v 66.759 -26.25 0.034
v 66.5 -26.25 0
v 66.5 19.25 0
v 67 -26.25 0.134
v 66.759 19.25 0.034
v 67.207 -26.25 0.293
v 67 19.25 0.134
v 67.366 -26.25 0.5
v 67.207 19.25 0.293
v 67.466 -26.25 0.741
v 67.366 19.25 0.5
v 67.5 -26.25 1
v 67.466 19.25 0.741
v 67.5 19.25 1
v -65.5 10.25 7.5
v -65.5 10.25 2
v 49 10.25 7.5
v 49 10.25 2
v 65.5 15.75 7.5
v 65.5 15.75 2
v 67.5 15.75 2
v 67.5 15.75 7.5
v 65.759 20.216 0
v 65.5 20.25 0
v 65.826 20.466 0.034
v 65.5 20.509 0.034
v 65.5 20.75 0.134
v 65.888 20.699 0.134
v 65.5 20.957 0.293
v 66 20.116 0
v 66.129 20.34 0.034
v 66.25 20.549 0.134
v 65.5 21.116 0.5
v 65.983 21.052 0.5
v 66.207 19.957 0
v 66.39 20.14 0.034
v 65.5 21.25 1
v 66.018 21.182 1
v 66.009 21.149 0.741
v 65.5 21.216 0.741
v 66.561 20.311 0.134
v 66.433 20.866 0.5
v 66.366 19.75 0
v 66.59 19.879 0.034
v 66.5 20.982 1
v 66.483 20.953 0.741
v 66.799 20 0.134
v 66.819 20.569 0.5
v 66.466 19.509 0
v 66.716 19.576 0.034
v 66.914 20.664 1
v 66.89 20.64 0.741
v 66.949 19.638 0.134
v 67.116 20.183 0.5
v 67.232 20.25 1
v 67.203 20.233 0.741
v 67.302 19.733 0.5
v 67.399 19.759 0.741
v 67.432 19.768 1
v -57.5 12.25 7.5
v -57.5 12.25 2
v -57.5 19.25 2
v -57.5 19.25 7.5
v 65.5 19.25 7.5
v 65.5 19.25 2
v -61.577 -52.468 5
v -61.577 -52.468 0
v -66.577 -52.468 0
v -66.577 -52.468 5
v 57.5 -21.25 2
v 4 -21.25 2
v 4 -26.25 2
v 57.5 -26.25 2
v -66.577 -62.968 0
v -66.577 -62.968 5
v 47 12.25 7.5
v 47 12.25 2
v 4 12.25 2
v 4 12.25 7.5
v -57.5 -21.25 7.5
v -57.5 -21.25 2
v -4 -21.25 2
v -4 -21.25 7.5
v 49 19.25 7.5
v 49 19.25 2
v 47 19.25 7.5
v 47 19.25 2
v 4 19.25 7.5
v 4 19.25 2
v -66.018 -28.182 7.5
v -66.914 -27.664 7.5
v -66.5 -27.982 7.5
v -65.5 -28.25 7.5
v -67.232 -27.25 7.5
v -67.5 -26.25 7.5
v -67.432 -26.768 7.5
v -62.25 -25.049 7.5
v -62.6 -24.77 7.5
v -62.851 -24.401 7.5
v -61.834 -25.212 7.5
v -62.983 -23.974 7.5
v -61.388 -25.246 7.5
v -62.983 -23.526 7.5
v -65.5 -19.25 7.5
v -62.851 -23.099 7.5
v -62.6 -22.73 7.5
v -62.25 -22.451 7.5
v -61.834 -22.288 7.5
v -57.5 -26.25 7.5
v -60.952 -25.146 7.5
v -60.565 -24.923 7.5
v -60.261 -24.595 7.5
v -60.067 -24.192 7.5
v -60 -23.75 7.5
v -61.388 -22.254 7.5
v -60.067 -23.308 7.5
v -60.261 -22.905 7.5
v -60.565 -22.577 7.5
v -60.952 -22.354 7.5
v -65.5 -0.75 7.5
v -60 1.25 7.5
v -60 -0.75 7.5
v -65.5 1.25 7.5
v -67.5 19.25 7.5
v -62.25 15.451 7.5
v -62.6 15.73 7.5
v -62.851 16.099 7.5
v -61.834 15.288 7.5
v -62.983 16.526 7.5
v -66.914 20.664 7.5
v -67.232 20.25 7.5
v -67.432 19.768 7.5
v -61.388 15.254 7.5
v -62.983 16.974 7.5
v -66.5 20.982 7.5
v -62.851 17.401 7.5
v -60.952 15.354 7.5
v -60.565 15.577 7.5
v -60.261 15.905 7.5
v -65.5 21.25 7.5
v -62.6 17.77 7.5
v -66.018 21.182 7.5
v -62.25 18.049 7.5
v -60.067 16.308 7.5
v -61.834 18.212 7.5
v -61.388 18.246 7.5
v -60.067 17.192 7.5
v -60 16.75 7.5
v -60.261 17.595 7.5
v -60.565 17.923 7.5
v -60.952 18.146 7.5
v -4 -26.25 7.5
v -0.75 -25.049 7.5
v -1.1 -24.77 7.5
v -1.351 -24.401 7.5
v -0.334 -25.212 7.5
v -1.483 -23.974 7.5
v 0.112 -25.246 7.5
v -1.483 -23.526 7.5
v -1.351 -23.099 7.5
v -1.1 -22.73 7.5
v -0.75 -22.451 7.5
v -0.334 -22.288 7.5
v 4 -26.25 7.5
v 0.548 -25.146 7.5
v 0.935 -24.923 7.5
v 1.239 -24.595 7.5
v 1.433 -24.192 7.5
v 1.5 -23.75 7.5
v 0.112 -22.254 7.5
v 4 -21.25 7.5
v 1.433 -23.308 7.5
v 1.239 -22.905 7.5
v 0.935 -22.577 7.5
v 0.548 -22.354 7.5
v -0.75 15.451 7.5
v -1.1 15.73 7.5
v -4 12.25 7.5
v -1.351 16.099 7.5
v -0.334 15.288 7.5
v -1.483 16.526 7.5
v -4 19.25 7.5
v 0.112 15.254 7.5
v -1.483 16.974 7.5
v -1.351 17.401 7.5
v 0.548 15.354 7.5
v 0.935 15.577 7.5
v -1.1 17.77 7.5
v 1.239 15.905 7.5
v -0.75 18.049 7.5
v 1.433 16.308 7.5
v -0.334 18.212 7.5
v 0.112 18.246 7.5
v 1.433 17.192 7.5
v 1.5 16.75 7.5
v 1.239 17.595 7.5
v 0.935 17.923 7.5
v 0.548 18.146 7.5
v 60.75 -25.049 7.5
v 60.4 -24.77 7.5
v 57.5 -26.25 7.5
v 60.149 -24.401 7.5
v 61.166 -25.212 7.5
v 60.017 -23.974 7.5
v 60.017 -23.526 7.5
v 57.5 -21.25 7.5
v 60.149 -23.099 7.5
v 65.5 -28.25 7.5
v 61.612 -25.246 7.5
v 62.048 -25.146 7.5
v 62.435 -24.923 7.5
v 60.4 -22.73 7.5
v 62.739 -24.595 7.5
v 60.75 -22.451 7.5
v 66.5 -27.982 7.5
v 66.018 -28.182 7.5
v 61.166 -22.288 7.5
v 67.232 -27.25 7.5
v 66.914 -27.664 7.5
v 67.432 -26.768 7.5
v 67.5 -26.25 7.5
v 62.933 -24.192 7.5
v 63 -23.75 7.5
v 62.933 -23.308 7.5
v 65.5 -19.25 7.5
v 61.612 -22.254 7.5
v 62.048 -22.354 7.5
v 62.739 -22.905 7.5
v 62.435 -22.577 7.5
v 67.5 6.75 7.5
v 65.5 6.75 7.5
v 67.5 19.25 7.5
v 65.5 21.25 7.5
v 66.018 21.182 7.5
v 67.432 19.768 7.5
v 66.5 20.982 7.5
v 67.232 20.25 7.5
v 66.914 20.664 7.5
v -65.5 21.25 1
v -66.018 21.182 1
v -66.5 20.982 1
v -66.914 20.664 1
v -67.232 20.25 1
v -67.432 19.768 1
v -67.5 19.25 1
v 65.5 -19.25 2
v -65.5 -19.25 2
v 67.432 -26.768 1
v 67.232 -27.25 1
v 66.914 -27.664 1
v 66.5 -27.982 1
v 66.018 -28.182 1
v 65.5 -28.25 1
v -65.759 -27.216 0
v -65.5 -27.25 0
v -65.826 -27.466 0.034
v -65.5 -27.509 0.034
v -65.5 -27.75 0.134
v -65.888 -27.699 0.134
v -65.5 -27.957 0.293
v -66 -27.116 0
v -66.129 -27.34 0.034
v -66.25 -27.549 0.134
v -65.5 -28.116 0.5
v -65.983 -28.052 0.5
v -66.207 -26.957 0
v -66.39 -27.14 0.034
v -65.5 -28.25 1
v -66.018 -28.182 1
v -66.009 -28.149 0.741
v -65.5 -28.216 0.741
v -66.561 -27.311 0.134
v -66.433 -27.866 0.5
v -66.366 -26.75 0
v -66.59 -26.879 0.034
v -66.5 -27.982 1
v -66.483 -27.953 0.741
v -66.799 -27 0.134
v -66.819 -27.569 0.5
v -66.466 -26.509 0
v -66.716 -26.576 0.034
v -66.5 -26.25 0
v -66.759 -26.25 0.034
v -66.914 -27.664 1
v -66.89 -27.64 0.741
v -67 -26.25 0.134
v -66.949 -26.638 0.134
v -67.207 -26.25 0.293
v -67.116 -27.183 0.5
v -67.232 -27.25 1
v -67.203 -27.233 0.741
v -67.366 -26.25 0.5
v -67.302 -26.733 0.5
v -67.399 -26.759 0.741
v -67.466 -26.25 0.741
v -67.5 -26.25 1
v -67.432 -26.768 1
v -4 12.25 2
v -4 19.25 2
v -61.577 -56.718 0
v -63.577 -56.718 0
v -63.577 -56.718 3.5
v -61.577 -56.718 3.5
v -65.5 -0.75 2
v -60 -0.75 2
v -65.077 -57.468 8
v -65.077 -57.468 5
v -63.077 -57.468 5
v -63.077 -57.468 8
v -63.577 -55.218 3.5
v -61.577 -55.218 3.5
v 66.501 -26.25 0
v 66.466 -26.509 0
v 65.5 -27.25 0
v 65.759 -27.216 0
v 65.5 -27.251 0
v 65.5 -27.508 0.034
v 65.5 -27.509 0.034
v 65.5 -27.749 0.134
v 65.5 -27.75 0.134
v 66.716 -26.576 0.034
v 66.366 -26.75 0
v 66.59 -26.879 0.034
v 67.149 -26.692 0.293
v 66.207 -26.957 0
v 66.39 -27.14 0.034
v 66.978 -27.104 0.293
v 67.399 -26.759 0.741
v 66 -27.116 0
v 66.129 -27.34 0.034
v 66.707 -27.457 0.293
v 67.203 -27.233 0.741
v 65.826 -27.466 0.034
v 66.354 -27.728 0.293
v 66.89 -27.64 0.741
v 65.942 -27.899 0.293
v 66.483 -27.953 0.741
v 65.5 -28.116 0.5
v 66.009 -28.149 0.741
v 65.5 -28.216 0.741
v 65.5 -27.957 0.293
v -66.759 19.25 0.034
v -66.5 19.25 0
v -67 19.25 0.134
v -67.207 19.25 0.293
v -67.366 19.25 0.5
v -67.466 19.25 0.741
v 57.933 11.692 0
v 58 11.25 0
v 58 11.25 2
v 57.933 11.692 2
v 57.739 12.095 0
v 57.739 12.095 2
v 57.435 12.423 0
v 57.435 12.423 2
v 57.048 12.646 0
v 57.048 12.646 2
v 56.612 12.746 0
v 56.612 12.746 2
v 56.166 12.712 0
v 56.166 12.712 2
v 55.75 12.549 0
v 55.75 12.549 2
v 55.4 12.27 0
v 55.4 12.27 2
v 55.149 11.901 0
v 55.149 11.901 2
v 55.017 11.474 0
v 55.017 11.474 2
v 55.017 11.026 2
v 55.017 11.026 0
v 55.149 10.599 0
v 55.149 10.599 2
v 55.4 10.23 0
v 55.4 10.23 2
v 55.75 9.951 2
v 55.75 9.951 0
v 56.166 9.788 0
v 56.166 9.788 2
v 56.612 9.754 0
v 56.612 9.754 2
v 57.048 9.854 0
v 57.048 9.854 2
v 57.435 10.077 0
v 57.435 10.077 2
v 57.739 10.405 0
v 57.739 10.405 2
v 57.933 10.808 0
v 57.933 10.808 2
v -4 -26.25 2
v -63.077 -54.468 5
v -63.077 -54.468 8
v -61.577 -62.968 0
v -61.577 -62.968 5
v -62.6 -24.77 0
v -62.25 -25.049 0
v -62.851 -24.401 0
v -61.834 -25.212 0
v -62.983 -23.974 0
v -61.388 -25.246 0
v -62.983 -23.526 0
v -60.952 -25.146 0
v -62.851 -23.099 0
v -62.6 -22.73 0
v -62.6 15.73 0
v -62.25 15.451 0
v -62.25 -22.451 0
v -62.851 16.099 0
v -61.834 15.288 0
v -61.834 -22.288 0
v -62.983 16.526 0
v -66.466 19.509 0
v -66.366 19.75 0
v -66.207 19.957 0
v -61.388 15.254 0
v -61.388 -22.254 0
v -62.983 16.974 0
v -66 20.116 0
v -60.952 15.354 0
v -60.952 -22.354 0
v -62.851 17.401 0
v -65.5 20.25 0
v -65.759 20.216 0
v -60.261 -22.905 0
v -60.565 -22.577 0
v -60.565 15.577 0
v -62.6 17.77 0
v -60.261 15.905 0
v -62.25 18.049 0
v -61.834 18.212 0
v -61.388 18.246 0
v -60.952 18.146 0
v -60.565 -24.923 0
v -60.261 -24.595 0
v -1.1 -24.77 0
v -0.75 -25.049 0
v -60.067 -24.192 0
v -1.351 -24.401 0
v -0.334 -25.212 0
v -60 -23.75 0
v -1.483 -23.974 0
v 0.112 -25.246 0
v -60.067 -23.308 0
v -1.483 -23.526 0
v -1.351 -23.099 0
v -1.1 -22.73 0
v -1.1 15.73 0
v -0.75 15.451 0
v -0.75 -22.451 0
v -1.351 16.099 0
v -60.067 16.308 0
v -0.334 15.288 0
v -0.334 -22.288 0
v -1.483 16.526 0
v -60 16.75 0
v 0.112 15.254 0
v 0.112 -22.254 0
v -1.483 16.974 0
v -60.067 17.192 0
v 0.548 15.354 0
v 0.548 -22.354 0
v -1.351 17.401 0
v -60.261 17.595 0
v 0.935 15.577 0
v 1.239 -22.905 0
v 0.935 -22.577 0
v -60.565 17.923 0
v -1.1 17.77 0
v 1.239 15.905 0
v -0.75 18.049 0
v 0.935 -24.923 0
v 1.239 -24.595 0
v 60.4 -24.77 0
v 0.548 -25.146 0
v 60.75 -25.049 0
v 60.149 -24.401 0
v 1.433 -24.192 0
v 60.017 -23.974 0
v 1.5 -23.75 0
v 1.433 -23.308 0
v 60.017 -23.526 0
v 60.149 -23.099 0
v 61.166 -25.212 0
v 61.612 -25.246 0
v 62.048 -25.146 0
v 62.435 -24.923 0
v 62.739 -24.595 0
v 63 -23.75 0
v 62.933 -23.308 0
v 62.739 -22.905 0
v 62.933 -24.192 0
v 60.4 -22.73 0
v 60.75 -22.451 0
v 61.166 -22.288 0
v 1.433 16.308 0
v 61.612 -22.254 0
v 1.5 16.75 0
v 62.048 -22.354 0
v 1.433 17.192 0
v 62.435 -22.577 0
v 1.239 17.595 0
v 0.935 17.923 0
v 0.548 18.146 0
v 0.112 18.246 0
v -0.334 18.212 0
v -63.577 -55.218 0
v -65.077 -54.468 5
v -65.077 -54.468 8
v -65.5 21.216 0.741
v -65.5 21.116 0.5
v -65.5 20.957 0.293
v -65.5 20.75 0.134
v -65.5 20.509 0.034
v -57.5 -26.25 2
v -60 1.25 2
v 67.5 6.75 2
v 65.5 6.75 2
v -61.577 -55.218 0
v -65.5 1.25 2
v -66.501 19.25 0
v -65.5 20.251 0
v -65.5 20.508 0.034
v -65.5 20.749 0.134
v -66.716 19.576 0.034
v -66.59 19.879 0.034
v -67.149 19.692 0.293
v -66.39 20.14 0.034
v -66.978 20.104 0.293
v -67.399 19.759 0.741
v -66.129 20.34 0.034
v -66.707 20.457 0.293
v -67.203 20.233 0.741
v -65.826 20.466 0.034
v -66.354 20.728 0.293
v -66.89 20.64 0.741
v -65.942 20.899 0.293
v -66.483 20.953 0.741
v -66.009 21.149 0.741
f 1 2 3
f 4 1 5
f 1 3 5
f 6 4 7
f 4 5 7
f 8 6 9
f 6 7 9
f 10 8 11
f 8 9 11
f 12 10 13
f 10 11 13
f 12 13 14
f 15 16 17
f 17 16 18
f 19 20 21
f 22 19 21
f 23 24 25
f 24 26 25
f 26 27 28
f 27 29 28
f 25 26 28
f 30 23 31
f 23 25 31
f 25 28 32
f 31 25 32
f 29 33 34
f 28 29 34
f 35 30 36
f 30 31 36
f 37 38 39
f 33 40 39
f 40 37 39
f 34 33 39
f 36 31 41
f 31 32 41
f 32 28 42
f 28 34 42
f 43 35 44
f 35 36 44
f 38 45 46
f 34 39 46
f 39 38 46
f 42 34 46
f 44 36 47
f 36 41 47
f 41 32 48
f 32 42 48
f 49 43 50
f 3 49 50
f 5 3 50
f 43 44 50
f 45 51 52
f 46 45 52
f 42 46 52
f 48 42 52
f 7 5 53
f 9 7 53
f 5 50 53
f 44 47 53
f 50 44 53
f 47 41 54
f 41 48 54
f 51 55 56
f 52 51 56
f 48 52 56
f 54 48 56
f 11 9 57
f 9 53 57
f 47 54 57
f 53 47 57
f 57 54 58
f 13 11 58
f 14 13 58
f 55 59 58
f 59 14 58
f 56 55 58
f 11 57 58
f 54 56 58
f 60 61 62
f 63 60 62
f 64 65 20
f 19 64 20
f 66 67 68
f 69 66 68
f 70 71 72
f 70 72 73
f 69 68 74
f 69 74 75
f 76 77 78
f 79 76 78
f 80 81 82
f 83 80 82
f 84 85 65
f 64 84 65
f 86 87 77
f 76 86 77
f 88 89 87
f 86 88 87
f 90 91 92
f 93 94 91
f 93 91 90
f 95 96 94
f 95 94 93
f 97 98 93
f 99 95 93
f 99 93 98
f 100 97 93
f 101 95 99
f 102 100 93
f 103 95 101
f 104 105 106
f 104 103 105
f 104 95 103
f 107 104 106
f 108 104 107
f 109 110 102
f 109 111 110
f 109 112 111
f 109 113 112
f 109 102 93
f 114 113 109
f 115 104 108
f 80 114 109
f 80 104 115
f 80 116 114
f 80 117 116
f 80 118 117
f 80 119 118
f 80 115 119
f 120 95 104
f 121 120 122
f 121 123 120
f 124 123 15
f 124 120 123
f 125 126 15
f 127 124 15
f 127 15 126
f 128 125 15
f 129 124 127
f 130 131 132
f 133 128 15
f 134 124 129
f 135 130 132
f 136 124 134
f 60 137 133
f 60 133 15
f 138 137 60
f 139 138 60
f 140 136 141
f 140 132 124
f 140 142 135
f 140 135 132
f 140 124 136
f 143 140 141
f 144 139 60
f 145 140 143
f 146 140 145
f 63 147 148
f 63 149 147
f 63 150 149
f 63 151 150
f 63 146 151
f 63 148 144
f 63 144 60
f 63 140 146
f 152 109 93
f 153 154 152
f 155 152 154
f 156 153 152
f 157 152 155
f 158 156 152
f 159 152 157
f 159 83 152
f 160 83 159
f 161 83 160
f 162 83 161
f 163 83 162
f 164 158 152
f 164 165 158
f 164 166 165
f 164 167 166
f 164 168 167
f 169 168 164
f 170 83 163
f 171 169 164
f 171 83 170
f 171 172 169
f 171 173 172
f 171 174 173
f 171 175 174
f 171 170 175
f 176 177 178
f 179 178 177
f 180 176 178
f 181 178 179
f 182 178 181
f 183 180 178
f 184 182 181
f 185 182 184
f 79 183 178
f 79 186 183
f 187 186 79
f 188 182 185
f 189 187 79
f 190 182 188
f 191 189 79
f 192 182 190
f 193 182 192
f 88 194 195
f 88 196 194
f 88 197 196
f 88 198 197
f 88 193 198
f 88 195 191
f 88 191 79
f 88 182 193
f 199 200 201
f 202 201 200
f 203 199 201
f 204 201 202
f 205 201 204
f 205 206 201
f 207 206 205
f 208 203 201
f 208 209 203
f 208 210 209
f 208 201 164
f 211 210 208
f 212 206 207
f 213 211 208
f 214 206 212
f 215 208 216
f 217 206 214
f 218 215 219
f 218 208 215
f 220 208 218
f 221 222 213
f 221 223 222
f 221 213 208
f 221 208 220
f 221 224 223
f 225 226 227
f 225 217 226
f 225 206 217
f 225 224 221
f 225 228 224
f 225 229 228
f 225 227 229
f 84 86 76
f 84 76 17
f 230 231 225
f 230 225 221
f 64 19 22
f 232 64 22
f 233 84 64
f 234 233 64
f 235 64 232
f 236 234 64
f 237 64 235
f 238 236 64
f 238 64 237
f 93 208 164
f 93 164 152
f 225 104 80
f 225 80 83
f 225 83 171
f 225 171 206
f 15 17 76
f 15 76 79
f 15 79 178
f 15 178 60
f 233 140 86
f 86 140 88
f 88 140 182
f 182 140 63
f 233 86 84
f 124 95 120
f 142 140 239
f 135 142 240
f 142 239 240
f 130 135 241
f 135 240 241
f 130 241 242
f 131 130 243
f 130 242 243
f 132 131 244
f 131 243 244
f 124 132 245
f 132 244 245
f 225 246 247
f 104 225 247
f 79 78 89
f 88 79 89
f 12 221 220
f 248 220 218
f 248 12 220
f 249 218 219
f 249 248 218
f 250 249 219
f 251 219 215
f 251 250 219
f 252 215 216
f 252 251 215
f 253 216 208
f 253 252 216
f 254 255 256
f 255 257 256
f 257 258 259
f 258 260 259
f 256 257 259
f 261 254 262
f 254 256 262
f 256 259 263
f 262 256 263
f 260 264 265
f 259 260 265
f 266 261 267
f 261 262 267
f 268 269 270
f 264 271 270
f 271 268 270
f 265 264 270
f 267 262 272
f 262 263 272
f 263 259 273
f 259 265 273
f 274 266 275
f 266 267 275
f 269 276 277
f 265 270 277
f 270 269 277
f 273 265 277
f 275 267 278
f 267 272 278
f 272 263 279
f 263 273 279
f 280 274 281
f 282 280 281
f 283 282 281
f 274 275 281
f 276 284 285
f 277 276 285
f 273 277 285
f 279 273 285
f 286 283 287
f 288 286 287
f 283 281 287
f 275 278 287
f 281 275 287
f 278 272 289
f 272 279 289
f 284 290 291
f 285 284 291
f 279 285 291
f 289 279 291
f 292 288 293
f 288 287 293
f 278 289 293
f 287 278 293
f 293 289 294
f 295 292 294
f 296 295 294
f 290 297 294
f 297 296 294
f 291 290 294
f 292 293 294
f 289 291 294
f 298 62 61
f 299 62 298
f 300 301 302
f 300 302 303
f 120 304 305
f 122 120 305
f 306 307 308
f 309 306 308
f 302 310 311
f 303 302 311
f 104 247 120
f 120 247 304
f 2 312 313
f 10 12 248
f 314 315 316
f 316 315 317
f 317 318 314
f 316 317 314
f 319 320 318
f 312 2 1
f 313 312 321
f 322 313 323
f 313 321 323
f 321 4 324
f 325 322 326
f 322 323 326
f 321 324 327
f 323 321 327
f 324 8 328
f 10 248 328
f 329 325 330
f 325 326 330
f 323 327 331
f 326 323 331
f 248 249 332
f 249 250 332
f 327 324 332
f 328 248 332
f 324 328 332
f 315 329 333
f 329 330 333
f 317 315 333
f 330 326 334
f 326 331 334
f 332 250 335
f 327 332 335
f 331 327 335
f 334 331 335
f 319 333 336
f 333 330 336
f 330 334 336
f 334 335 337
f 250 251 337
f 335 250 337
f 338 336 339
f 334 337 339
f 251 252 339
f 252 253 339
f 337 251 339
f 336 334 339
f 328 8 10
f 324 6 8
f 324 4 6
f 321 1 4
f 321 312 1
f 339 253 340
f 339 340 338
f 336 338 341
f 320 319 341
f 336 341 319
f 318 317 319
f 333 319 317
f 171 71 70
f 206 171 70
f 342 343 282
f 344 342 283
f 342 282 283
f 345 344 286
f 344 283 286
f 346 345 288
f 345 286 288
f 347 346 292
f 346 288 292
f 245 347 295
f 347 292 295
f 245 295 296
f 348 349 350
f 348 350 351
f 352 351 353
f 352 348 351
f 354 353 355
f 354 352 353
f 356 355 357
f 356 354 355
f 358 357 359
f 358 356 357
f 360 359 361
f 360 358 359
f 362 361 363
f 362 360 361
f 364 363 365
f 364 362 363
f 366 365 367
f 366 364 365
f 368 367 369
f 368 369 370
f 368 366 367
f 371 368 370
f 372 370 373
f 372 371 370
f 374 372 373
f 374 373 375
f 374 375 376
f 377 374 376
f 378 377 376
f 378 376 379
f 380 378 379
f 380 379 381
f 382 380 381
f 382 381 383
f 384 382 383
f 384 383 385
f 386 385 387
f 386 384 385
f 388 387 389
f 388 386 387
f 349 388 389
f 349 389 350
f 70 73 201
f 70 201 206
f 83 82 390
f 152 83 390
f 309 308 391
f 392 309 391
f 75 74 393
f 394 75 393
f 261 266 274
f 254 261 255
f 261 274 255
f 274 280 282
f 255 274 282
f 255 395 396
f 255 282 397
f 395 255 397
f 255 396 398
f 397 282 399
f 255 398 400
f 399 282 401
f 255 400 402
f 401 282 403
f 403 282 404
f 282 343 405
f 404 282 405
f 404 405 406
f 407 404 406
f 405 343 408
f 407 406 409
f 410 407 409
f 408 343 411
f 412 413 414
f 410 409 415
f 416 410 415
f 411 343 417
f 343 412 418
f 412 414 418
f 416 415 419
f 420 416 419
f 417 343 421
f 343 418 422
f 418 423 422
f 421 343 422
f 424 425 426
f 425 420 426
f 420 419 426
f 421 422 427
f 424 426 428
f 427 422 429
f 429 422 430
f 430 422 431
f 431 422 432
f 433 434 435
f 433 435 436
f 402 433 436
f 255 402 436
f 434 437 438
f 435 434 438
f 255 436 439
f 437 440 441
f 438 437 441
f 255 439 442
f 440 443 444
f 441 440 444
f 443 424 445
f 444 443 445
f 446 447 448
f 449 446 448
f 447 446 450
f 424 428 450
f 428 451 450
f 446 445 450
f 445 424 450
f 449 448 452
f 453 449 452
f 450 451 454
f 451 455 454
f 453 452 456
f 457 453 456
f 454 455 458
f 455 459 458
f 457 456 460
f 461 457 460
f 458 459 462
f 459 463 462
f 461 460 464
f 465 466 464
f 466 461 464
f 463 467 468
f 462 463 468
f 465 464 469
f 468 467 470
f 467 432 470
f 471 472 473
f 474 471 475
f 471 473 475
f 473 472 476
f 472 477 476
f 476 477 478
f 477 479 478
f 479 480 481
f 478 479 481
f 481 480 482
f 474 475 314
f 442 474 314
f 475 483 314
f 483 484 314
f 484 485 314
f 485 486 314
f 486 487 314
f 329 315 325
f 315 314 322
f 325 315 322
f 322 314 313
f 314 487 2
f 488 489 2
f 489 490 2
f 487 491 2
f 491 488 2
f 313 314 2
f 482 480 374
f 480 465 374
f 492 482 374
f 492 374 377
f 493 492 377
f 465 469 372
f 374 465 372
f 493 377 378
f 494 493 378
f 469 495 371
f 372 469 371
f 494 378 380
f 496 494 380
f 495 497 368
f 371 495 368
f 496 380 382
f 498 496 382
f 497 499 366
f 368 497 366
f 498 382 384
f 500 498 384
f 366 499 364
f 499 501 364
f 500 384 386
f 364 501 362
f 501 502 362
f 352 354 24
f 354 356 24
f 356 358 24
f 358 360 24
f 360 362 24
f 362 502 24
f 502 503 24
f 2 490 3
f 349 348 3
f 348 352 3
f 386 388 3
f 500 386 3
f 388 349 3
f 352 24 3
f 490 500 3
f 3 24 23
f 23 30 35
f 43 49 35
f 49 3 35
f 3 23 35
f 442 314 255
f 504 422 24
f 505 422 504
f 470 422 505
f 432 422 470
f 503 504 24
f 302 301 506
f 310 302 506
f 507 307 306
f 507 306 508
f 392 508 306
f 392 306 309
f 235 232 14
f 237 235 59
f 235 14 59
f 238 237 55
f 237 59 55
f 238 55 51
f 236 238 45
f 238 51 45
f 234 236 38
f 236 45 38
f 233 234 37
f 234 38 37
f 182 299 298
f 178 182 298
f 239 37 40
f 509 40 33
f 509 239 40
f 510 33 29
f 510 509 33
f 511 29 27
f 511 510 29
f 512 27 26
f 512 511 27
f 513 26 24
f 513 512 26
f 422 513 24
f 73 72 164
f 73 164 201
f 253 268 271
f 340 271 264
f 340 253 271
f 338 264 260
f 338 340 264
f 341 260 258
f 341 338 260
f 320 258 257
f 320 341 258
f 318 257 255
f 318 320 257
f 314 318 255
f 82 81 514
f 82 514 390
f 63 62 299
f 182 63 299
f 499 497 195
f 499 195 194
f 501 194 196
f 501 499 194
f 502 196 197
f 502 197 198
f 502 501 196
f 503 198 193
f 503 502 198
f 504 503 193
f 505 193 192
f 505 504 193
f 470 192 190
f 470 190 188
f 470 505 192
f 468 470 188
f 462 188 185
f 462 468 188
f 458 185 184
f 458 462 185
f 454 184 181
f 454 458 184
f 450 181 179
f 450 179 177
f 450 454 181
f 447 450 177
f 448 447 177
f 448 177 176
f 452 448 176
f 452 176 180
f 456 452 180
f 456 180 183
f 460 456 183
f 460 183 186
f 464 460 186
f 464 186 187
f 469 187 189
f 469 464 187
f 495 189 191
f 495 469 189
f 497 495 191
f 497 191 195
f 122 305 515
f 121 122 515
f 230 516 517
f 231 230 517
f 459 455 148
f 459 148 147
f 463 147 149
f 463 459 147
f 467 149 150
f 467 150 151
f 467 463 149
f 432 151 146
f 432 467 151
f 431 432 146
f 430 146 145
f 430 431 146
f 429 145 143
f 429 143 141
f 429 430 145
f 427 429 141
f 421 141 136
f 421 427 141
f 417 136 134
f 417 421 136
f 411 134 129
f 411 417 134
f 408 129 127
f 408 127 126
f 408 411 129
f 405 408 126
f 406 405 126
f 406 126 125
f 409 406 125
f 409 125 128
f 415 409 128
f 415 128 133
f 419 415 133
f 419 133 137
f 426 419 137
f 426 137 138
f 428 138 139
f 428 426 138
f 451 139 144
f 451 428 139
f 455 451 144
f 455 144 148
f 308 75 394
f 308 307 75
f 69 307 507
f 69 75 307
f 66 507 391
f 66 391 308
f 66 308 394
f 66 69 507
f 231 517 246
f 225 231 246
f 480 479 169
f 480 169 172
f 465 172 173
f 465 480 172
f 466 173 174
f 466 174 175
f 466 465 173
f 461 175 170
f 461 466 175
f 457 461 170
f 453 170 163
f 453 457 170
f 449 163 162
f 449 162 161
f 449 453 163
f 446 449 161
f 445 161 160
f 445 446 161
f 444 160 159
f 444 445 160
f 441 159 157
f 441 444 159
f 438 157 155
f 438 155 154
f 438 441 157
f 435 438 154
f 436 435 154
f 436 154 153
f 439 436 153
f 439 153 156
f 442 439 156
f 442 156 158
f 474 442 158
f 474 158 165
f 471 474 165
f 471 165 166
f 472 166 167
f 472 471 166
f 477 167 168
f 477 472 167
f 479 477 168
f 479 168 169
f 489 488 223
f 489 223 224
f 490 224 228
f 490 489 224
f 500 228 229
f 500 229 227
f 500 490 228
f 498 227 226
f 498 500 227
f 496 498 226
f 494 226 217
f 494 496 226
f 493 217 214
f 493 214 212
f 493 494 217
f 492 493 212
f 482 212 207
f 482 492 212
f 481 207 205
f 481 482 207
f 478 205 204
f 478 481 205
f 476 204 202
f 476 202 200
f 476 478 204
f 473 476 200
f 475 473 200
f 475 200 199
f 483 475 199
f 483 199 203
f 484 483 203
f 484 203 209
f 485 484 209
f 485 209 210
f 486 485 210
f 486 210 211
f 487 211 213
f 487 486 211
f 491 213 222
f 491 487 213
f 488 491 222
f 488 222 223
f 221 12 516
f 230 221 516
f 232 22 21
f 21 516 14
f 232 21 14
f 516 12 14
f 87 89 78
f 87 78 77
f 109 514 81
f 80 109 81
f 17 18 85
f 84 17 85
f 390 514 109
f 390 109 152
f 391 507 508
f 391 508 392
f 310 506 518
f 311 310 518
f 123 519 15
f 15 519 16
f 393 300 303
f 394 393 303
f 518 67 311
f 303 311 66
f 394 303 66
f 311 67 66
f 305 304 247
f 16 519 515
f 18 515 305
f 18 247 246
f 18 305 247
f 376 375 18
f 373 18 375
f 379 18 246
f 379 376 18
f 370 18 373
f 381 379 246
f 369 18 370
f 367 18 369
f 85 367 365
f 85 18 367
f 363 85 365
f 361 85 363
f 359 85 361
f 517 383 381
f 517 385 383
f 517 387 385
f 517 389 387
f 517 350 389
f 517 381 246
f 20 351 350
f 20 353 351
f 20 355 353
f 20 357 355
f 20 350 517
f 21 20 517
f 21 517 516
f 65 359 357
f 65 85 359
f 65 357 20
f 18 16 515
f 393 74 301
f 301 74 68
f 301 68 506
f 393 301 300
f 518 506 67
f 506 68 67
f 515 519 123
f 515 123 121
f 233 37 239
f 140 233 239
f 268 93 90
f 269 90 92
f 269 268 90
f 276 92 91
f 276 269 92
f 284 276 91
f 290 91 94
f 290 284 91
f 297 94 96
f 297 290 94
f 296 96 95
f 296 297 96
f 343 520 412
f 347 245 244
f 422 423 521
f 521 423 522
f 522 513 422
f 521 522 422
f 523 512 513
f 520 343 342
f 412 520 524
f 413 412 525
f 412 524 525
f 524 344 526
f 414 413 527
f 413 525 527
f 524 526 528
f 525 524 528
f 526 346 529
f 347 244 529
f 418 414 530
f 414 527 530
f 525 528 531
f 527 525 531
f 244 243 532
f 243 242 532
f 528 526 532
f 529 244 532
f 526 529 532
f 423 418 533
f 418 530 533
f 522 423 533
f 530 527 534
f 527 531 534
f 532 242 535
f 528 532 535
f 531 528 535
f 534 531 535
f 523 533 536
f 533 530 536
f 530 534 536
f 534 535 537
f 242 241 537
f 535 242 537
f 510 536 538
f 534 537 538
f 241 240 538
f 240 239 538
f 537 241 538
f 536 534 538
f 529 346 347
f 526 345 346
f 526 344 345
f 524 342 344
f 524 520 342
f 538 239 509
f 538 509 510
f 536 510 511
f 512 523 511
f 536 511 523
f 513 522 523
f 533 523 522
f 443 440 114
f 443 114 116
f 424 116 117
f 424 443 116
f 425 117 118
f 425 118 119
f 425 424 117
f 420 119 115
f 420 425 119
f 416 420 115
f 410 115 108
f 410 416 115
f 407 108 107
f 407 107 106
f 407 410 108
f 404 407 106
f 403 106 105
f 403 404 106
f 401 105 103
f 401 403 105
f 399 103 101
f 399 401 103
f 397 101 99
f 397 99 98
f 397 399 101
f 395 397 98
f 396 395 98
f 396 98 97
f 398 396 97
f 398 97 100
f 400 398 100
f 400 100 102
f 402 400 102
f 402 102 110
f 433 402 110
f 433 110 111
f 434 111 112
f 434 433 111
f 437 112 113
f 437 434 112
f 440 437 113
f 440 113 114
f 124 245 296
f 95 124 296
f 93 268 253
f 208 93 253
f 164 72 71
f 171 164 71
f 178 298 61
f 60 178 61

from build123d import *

# Parameters (mm, degrees)
F0_W         = 52
F0_H         = 22
F0_R         = 1.5
F0_W_2       = 5.5
F0_H_2       = 9
F0_H_3       = 18.5
F0_W_3       = 2
F0_W_4       = 48
F0_H_4       = 18
F1_DEPTH     = 2
F0_W_5       = 53.5
F0_H_5       = 7
F0_W_6       = 43
F0_H_6       = 5
F0_H_7       = 2
F0_W_7       = 8
F0_W_8       = 10
F2_DEPTH     = 7.5
F3_W         = 2
F3_H         = 1.5
F4_DEPTH     = 5
F5_DEPTH     = 3.5
F6_W         = 2
F6_H         = 3
F7_DEPTH     = 3
F8_R         = 1
F9_T1_DEPTH  = 12.5
F9_T4_ANGLE  = 90
F9_T6_ANGLE  = 90
F9_T8_ANGLE  = 90
F9_T10_ANGLE = 90
F10_DEPTH    = 2
F11_DEPTH    = 1
F12_DEPTH    = 2.5


# Not quite as in the source:
# - a fillet or chamfer that OpenCascade refuses, or shapes differently, is made with other operations: its cross-section is extruded or revolved along the edge and cut away or added


with BuildPart() as f1:
    # F0 (on Top) → F1 (new body)
    with BuildSketch(Plane.XY):
        Polygon((65.5, 15.75), (65.5, 19.25), (49, 19.25), (49, 10.25), (-60, 10.25), (-60, 1.25), (-60, -0.75), (-60, -19.25), (-4, -19.25), (4, -19.25), (57.5, -19.25), (65.5, -19.25), (65.5, 6.75), align=None)
        with Locations((0, -4.25)):
            Rectangle(F0_W, F0_H, mode=Mode.SUBTRACT)
        with Locations((56.5, 11.25)):
            Circle(F0_R, mode=Mode.SUBTRACT)
        with Locations((-62.75, 5.75)):
            Rectangle(F0_W_2, F0_H_2)
        with Locations((-62.75, -10)):
            Rectangle(F0_W_2, F0_H_3)
        with Locations((66.5, 11.25)):
            Rectangle(F0_W_3, F0_H_2)
        with Locations((0, -4.25)):
            Rectangle(F0_W, F0_H)
        with Locations((0, -4.25)):
            Rectangle(F0_W_4, F0_H_4, mode=Mode.SUBTRACT)
    extrude(amount=F1_DEPTH)



with BuildPart() as f1b:
    # F0 (on Top) → F1, piece 2 (new body)
    with BuildSketch(Plane.XY):
        with Locations((-30.75, 15.75)):
            Rectangle(F0_W_5, F0_H_5)
    extrude(amount=F1_DEPTH)


with BuildPart() as f1c:
    # F0 (on Top) → F1, piece 3 (new body)
    with BuildSketch(Plane.XY):
        with Locations((25.5, 15.75)):
            Rectangle(F0_W_6, F0_H_5)
    extrude(amount=F1_DEPTH)


with BuildPart() as f1d:
    # F0 (on Top) → F1, piece 4 (new body)
    with BuildSketch(Plane.XY):
        with Locations((30.75, -23.75)):
            Rectangle(F0_W_5, F0_H_6)
    extrude(amount=F1_DEPTH)


with BuildPart() as f1e:
    # F0 (on Top) → F1, piece 5 (new body)
    with BuildSketch(Plane.XY):
        with Locations((-30.75, -23.75)):
            Rectangle(F0_W_5, F0_H_6)
    extrude(amount=F1_DEPTH)


with BuildPart() as f1_1:
    add(f1.part)

    add(f1b.part)  # F2 merges F1b

    add(f1c.part)  # F2 merges F1c

    add(f1d.part)  # F2 merges F1d

    add(f1e.part)  # F2 merges F1e
    # F0 (on Top) → F2 (join)
    with BuildSketch(Plane.XY):
        Polygon((49, 10.25), (49, 19.25), (47, 19.25), (47, 12.25), (4, 12.25), (-4, 12.25), (-57.5, 12.25), (-65.5, 12.25), (-65.5, 10.25), (-60, 10.25), align=None)
        with Locations((-66.5, 11.25)):
            Rectangle(F0_W_3, F0_H_7)
        with Locations((-66.5, 5.75)):
            Rectangle(F0_W_3, F0_H_2)
        with Locations((-66.5, 0.25)):
            Rectangle(F0_W_3, F0_H_7)
        with Locations((-62.75, 0.25)):
            Rectangle(F0_W_2, F0_H_7)
        Polygon((-65.5, -19.25), (-65.5, -0.75), (-67.5, -0.75), (-67.5, -21.25), (-57.5, -21.25), (-4, -21.25), (-4, -19.25), (-60, -19.25), align=None)
        Polygon((49, 19.25), (65.5, 19.25), (65.5, 15.75), (67.5, 15.75), (67.5, 21.25), (47, 21.25), (47, 19.25), align=None)
        with Locations((0, -20.25)):
            Rectangle(F0_W_7, F0_H_7)
        with Locations((0, -23.75)):
            Rectangle(F0_W_7, F0_H_6)
        with Locations((0, -23.75)):
            Circle(F0_R, mode=Mode.SUBTRACT)
        with Locations((30.75, -20.25)):
            Rectangle(F0_W_5, F0_H_7)
        with Locations((0, -27.25)):
            Rectangle(F0_W_7, F0_H_7)
        with Locations((-30.75, -27.25)):
            Rectangle(F0_W_5, F0_H_7)
        with Locations((30.75, -27.25)):
            Rectangle(F0_W_5, F0_H_7)
        with Locations((-62.5, -23.75)):
            Rectangle(F0_W_8, F0_H_6)
        with Locations((-61.5, -23.75)):
            Circle(F0_R, mode=Mode.SUBTRACT)
        with Locations((-62.5, -27.25)):
            Rectangle(F0_W_8, F0_H_7)
        Polygon((67.5, 6.75), (65.5, 6.75), (65.5, -19.25), (57.5, -19.25), (57.5, -21.25), (67.5, -21.25), align=None)
        with Locations((62.5, -23.75)):
            Rectangle(F0_W_8, F0_H_6)
        with Locations((61.5, -23.75)):
            Circle(F0_R, mode=Mode.SUBTRACT)
        with Locations((62.5, -27.25)):
            Rectangle(F0_W_8, F0_H_7)
        with Locations((25.5, 20.25)):
            Rectangle(F0_W_6, F0_H_7)
        with Locations((0, 20.25)):
            Rectangle(F0_W_7, F0_H_7)
        with Locations((0, 15.75)):
            Rectangle(F0_W_7, F0_H_5)
        with Locations((0, 16.75)):
            Circle(F0_R, mode=Mode.SUBTRACT)
        with Locations((-61.5, 15.75)):
            Rectangle(F0_W_7, F0_H_5)
        with Locations((-61.5, 16.75)):
            Circle(F0_R, mode=Mode.SUBTRACT)
        Polygon((-65.5, 19.25), (-57.5, 19.25), (-57.5, 21.25), (-67.5, 21.25), (-67.5, 12.25), (-65.5, 12.25), align=None)
        with Locations((-30.75, 20.25)):
            Rectangle(F0_W_5, F0_H_7)
    extrude(amount=F2_DEPTH)

    # F8
    f8_edges = [f1_1.edges().sort_by_distance(p)[0] for p in [
        (67.5, -3.5, 0),
        (0, -28.25, 0),
        (0, 21.25, 0),
        (-67.5, -3.5, 0),
    ]]
    fillet(f8_edges, radius=F8_R)

    # F9: fillet of radius 2 on 4 edges, made by hand

    # F9_s2 → F9_t1 (cut)
    with BuildSketch(Plane.XY):
        with BuildLine():
            ThreePointArc((67.5, -26.25), (66.9142135624, -27.6642135624), (65.5, -28.25))
            Line((65.5, -28.25), (67.5, -28.25))
            Line((67.5, -28.25), (67.5, -26.25))
        make_face()
        with BuildLine():
            ThreePointArc((67.5, 19.25), (66.9142135624, 20.6642135624), (65.5, 21.25))
            Line((65.5, 21.25), (67.5, 21.25))
            Line((67.5, 21.25), (67.5, 19.25))
        make_face()
        with BuildLine():
            ThreePointArc((-65.5, 21.25), (-66.9142135624, 20.6642135624), (-67.5, 19.25))
            Line((-67.5, 19.25), (-67.5, 21.25))
            Line((-67.5, 21.25), (-65.5, 21.25))
        make_face()
        with BuildLine():
            ThreePointArc((-65.5, -28.25), (-66.9142135624, -27.6642135624), (-67.5, -26.25))
            Line((-67.5, -26.25), (-67.5, -28.25))
            Line((-67.5, -28.25), (-65.5, -28.25))
        make_face()
    extrude(amount=F9_T1_DEPTH, mode=Mode.SUBTRACT)

    # F9_s3 → F9_t4 (revolve, cut)
    with BuildSketch(Plane.YZ.offset(-65.5)):
        with BuildLine():
            ThreePointArc((-27.25, 0), (-27.9571067812, 0.2928932188), (-28.25, 1))
            Line((-28.25, 1), (-28.25, 0))
            Line((-28.25, 0), (-27.25, 0))
        make_face()
    revolve(axis=Axis((-65.5, -26.25, 0), (0, 0, -1)), revolution_arc=F9_T4_ANGLE, mode=Mode.SUBTRACT)

    # F9_s5 → F9_t6 (revolve, cut)
    with BuildSketch(Plane.XZ.offset(-19.25)):
        with BuildLine():
            ThreePointArc((-66.5, 0), (-67.2071067812, 0.2928932188), (-67.5, 1))
            Line((-67.5, 1), (-67.5, 0))
            Line((-67.5, 0), (-66.5, 0))
        make_face()
    revolve(axis=Axis((-65.5, 19.25, 0), (0, 0, -1)), revolution_arc=F9_T6_ANGLE, mode=Mode.SUBTRACT)

    # F9_s7 → F9_t8 (revolve, cut)
    with BuildSketch(Plane.YZ.offset(65.5)):
        with BuildLine():
            ThreePointArc((20.25, 0), (20.9571067812, 0.2928932188), (21.25, 1))
            Line((21.25, 1), (21.25, 0))
            Line((21.25, 0), (20.25, 0))
        make_face()
    revolve(axis=Axis((65.5, 19.25, 0), (0, 0, -1)), revolution_arc=F9_T8_ANGLE, mode=Mode.SUBTRACT)

    # F9_s9 → F9_t10 (revolve, cut)
    with BuildSketch(Plane.XZ.offset(26.25)):
        with BuildLine():
            ThreePointArc((66.5, 0), (67.2071067812, 0.2928932188), (67.5, 1))
            Line((67.5, 1), (67.5, 0))
            Line((67.5, 0), (66.5, 0))
        make_face()
    revolve(axis=Axis((65.5, -26.25, 0), (0, 0, -1)), revolution_arc=F9_T10_ANGLE, mode=Mode.SUBTRACT)

    # F0 (on Top) → F10 (join)
    with BuildSketch(Plane.XY):
        with Locations((0, -4.25)):
            Rectangle(F0_W_4, F0_H_4)
    extrude(amount=F10_DEPTH)


with BuildPart() as f4:
    # F3 (on Top) → F4 (new body)
    with BuildSketch(Plane.XY):
        Polygon((-61.5765547214, -49.9684383273), (-66.5765547214, -49.9684383273), (-66.5765547214, -61.9684383273), (-61.5765547214, -61.9684383273), (-61.5765547214, -56.7184383273), (-63.5765547214, -56.7184383273), (-63.5765547214, -55.2184383273), (-61.5765547214, -55.2184383273), align=None)
        with Locations((-62.5765547214, -55.9684383273)):
            Rectangle(F3_W, F3_H)
    extrude(amount=F4_DEPTH)

    # F3 (on Top) → F5 (cut)
    with BuildSketch(Plane.XY):
        with Locations((-62.5765547214, -55.9684383273)):
            Rectangle(F3_W, F3_H)
    extrude(amount=F5_DEPTH, mode=Mode.SUBTRACT)

    # F6 (on face) → F7 (join)
    with BuildSketch(Plane.XY.offset(5)):
        with Locations((-64.0765547214, -55.9684383273)):
            Rectangle(F6_W, F6_H)
    extrude(amount=F7_DEPTH)

    # F11 (add): a face of the model
    f11_faces = [f4.faces().sort_by_distance(p)[0] for p in [
        (-64.0765547214, -61.9684383273, 2.5),
    ]]
    extrude(f11_faces, amount=F11_DEPTH)

    # F12 (cut): a face of the model
    f12_faces = [f4.faces().sort_by_distance(p)[0] for p in [
        (-64.0765547214, -49.9684383273, 2.5),
    ]]
    extrude(f12_faces, amount=-F12_DEPTH, mode=Mode.SUBTRACT)


solid = Compound([f1_1.part, f4.part])
